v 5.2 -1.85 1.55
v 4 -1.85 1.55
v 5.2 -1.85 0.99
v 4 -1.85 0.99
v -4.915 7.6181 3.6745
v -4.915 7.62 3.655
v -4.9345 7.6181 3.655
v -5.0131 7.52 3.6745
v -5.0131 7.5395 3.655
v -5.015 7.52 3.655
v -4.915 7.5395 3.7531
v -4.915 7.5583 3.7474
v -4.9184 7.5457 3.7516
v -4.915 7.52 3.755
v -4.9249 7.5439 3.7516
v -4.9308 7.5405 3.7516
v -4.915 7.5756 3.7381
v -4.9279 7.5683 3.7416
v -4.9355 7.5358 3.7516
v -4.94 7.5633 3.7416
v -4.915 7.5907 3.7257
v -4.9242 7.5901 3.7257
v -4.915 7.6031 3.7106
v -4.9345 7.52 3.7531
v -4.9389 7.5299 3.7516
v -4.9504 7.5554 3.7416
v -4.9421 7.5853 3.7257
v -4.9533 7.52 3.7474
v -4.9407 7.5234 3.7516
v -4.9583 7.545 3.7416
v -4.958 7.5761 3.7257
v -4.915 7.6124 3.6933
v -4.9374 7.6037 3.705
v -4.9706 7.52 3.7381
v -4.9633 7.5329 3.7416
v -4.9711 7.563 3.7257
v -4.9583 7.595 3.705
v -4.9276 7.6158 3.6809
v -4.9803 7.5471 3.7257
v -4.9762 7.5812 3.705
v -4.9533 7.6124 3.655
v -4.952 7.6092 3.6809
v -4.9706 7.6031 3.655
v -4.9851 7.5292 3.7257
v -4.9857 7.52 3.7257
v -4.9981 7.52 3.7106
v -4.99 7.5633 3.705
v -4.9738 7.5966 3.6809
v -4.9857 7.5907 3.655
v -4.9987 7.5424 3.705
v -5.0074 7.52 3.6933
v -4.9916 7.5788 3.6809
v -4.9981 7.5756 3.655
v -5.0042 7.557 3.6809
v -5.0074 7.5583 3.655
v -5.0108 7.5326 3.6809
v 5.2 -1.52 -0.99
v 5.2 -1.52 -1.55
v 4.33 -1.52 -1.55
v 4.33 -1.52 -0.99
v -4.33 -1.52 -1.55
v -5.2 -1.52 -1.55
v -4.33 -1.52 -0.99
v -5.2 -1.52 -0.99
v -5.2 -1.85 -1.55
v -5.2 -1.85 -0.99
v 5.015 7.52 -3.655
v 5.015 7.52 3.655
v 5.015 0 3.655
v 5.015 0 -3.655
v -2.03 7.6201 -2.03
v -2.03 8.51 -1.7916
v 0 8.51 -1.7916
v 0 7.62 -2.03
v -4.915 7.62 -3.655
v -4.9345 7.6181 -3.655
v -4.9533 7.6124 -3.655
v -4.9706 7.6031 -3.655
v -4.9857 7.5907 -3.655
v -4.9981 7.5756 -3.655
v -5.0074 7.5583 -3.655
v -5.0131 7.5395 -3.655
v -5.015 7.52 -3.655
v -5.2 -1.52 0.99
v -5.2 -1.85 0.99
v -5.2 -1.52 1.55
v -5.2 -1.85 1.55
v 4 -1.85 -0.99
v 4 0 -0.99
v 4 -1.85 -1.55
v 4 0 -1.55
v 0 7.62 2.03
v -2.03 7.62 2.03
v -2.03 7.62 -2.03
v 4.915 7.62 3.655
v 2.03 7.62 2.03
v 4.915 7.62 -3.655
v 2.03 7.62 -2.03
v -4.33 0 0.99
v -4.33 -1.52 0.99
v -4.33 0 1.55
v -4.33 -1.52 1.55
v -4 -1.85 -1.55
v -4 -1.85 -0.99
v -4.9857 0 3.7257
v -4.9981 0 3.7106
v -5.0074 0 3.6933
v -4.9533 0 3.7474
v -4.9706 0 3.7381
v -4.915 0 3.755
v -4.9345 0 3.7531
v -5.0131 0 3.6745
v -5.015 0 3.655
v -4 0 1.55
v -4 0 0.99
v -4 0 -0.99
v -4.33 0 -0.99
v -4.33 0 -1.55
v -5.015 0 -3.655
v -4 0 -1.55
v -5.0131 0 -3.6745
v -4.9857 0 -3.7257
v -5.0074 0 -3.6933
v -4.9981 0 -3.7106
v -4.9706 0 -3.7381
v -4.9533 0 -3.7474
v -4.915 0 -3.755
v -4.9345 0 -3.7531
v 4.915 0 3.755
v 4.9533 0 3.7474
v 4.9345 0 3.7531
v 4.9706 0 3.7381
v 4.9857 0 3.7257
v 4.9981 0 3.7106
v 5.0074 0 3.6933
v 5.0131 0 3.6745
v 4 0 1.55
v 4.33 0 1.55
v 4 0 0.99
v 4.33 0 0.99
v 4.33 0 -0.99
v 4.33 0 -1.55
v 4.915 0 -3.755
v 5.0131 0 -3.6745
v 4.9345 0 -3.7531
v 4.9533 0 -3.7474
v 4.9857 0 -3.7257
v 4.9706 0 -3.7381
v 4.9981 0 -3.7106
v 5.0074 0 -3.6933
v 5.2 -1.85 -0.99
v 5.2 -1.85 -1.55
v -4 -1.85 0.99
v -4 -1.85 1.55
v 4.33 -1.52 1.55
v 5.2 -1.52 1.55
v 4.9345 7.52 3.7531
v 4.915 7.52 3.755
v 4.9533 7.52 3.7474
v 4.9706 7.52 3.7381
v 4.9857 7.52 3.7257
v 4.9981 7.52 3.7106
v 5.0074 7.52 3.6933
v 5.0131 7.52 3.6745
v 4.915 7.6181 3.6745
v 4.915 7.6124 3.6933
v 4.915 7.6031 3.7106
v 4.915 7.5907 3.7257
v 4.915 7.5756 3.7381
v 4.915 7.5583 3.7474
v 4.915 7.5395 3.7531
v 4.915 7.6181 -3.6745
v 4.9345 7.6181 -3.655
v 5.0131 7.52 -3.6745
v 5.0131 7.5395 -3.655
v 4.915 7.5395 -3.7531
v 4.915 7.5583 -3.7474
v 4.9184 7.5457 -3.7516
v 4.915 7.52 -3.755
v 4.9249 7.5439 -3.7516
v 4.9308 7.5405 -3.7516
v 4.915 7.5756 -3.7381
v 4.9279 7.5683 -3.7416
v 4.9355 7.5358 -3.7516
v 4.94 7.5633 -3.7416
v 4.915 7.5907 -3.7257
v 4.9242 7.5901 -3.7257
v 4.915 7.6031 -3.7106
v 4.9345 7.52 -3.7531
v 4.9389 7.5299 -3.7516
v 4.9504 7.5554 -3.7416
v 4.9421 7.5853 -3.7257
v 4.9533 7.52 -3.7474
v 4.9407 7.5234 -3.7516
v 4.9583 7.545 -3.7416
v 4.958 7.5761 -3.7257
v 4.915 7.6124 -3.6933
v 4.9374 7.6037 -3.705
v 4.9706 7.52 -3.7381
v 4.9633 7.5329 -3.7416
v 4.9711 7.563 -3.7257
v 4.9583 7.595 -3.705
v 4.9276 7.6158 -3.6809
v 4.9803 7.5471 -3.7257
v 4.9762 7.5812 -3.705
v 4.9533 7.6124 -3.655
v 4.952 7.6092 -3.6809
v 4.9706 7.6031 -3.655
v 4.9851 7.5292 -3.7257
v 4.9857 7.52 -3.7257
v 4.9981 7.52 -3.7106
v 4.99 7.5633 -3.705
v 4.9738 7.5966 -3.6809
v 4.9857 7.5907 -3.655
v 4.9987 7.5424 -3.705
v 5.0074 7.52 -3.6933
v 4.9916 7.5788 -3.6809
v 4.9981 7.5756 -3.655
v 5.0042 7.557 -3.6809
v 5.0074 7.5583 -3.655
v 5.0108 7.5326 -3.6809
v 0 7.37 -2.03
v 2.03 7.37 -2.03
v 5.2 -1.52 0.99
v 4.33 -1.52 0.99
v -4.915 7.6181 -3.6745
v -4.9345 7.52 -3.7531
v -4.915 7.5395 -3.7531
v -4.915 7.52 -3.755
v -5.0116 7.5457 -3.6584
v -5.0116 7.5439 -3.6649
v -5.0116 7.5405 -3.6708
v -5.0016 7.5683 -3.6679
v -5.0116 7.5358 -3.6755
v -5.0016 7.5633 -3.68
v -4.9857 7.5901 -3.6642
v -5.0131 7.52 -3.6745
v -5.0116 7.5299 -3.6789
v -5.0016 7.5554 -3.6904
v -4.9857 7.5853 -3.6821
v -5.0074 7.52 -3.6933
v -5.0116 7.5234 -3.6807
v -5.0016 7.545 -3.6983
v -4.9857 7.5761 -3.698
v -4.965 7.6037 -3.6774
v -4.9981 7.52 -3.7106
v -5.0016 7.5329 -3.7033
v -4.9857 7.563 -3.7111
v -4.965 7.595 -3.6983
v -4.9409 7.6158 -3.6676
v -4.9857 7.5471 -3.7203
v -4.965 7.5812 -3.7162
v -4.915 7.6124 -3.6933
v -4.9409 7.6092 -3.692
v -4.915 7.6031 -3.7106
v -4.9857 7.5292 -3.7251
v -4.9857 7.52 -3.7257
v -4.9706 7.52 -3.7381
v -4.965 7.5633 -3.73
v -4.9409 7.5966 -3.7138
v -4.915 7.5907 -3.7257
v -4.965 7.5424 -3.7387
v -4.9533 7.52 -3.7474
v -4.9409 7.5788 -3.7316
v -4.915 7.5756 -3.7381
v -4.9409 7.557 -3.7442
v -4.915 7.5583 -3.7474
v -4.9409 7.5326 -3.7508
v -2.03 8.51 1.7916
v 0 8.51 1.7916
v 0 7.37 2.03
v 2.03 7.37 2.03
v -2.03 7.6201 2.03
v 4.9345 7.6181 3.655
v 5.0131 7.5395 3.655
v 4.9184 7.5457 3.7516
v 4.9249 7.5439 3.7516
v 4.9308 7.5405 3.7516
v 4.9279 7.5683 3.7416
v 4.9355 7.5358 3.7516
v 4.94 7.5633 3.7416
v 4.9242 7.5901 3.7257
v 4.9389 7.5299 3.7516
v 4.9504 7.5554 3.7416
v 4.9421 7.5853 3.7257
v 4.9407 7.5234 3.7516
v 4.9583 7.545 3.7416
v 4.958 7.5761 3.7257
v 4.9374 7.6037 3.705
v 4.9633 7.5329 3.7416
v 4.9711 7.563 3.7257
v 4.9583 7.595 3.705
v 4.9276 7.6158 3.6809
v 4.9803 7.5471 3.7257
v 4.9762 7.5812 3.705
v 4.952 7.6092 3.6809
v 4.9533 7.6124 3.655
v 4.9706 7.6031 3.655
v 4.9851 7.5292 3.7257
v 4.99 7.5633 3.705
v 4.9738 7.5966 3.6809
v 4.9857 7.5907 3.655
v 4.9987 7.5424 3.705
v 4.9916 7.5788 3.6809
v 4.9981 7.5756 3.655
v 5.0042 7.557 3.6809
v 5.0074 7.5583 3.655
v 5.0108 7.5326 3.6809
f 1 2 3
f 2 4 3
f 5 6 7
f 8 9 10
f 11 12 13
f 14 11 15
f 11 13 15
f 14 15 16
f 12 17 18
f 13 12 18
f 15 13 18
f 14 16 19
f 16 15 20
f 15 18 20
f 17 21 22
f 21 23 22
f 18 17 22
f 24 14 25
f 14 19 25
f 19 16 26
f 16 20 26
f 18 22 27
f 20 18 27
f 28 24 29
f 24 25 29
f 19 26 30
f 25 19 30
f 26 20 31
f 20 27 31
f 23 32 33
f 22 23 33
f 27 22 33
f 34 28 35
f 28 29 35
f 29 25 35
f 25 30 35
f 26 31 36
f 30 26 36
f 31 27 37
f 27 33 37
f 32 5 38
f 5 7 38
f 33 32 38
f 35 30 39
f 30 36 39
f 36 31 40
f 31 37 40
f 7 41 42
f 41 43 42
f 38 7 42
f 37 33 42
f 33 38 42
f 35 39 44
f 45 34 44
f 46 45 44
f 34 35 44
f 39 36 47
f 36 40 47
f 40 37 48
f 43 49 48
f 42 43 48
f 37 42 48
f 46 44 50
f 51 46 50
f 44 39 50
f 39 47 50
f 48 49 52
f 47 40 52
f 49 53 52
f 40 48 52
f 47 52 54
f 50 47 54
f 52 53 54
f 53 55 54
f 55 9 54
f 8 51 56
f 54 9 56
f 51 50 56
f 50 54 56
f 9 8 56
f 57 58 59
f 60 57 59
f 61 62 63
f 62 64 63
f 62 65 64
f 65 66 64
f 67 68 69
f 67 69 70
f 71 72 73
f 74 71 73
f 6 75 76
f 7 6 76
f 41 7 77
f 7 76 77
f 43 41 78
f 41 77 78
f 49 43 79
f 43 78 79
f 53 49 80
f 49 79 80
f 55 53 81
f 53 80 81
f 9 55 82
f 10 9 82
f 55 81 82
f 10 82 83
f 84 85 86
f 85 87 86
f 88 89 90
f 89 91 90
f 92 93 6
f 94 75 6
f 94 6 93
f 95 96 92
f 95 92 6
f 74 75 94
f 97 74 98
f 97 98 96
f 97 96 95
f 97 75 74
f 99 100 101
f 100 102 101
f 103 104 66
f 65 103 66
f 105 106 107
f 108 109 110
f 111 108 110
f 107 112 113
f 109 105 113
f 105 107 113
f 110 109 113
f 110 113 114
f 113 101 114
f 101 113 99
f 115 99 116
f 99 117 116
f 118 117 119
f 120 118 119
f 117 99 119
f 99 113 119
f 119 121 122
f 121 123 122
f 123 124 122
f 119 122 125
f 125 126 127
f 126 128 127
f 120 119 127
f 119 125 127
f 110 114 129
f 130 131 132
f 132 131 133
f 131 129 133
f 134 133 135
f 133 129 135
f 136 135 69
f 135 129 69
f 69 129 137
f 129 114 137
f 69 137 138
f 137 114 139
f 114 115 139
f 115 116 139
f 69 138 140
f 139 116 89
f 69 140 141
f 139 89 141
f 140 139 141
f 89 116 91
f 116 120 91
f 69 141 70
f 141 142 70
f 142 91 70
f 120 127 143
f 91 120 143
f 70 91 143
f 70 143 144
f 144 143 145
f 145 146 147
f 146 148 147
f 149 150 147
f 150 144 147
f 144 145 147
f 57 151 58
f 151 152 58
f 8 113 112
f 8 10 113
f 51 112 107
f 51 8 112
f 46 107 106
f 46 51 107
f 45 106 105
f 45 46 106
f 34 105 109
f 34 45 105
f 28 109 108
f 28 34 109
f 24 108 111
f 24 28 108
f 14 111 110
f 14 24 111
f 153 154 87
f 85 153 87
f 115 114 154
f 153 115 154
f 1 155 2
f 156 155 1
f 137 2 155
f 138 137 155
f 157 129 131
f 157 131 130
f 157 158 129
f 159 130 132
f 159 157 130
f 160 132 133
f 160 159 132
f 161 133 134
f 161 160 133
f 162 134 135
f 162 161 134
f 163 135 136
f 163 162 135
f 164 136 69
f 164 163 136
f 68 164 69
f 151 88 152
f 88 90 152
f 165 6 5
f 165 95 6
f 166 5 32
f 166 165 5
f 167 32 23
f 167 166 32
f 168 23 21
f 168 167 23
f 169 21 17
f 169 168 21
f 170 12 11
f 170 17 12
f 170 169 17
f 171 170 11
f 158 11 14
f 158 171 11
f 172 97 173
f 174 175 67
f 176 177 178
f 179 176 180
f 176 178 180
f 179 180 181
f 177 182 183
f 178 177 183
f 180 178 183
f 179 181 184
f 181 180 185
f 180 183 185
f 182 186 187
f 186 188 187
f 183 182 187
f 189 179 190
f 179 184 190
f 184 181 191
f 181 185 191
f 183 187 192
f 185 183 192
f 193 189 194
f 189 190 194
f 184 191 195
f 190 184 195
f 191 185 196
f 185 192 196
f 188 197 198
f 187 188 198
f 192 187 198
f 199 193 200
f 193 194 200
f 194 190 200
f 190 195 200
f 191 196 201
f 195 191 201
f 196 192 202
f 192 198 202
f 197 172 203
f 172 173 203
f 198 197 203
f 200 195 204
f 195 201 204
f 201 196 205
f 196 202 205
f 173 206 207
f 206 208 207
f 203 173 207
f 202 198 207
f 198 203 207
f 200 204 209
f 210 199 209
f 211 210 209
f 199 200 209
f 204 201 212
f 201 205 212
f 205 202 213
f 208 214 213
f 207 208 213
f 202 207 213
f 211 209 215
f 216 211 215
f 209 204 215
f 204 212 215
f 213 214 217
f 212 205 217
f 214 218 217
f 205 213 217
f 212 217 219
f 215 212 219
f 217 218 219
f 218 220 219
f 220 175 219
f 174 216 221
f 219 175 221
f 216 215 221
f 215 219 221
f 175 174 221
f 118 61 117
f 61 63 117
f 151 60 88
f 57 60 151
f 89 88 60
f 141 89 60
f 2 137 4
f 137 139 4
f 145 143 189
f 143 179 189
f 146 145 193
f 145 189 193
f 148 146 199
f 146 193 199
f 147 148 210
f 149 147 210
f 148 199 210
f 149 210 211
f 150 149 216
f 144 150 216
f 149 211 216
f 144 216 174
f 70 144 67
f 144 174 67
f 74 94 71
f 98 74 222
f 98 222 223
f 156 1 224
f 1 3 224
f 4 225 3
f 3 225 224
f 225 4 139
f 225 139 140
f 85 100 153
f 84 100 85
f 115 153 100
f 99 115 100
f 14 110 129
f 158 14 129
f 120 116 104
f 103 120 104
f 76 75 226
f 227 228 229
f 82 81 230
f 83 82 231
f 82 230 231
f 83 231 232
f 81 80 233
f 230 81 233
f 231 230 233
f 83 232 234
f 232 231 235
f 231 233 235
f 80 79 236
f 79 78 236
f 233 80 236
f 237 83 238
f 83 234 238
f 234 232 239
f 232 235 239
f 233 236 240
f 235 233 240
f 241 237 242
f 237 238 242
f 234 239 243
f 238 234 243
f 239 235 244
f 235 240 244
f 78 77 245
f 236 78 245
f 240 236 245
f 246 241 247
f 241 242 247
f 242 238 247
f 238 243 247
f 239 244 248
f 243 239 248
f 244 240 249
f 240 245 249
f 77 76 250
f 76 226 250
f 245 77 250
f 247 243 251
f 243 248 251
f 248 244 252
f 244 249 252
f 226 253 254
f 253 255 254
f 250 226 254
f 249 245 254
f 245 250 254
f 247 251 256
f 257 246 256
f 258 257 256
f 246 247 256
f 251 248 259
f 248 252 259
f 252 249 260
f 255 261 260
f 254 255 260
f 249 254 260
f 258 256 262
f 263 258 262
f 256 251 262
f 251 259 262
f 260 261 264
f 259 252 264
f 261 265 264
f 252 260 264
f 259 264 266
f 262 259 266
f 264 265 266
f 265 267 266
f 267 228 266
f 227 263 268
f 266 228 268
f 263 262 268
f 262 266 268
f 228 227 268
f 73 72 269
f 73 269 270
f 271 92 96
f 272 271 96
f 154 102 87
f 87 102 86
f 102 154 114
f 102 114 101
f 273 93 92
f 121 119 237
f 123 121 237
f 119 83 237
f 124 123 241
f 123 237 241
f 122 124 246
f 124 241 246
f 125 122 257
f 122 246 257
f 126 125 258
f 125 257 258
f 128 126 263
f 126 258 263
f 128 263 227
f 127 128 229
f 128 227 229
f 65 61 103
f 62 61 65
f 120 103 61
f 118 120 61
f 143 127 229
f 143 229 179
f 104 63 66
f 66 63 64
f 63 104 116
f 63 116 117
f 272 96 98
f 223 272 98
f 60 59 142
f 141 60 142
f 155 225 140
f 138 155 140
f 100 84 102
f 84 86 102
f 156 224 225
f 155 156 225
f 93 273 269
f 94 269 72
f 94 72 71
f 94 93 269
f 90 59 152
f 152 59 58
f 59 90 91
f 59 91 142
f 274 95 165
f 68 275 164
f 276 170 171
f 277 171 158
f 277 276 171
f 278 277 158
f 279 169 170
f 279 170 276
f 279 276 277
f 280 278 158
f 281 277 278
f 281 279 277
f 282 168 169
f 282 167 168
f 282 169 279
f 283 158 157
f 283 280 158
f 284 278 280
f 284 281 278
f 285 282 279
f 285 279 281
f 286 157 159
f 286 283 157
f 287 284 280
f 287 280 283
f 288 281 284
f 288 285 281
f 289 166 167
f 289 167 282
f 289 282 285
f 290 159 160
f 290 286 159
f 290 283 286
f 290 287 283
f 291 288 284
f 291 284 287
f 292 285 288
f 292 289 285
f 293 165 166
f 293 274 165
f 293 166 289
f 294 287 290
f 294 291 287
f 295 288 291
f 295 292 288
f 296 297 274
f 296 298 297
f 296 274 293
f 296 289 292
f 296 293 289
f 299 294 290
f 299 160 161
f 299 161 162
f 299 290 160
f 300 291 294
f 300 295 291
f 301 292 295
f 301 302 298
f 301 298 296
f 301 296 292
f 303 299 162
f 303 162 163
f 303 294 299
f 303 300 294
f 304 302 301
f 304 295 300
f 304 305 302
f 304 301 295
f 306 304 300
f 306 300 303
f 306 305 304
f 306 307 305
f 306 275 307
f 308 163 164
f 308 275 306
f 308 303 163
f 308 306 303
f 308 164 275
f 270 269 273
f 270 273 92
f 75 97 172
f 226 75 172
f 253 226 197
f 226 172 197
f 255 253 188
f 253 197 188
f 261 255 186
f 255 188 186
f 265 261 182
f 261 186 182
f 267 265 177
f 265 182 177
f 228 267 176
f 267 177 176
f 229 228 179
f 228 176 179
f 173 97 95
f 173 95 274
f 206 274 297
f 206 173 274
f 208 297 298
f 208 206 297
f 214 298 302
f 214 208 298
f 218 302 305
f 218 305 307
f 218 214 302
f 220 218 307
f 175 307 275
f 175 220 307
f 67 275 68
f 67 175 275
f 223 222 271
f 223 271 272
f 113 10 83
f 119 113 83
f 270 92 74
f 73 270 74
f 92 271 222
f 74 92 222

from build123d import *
from OCP.BRepFilletAPI import BRepFilletAPI_MakeChamfer

# Parameters (mm, degrees)
SKETCH1_W           = 10.03
SKETCH1_H           = 7.51
BOSS_EXTRUDE1_DEPTH = 7.62
SKETCH2_W           = 2.03
SKETCH2_H           = 4.06
BOSS_EXTRUDE2_DEPTH = 0.89
CHAMFER1_SIZE       = 0.89
CHAMFER1_SIZE_2     = 0.238474781
SKETCH3_W           = 2.03
SKETCH3_H           = 4.06
CUT_EXTRUDE1_DEPTH  = 0.25
BOSS_EXTRUDE3_DEPTH = 0.28
LPATTERN1_COUNT     = 2
LPATTERN1_PITCH     = 2.54
FILLET1_R           = 0.1


with BuildPart() as part:
    # Sketch1 → Boss-Extrude1 (new body)
    with BuildSketch(Plane(origin=(0, 0, 0), x_dir=(1, 0, 0), z_dir=(0, 1, 0))):
        Rectangle(SKETCH1_W, SKETCH1_H)
    extrude(amount=BOSS_EXTRUDE1_DEPTH)

    # Sketch2 → Boss-Extrude2 (add)
    with BuildSketch(Plane(origin=(0, 7.62, 0), x_dir=(1, 0, 0), z_dir=(0, 1, 0))):
        with Locations((-1.015, 0)):
            Rectangle(SKETCH2_W, SKETCH2_H)
    extrude(amount=BOSS_EXTRUDE2_DEPTH)

    # Chamfer1
    chamfer1_edges_1 = [part.edges().sort_by_distance(p)[0] for p in [
        (-1.015, 8.51, -2.03),
    ]]
    chamfer1_side_1 = [part.faces().sort_by_distance(p)[0] for p in [
        (-1.015, 8.505230504, -2.03),
    ]]
    chamfer1_edges_2 = [part.edges().sort_by_distance(p)[0] for p in [
        (-1.015, 8.51, 2.03),
    ]]
    chamfer1_side_2 = [part.faces().sort_by_distance(p)[0] for p in [
        (-1.015, 8.505230504, 2.03),
    ]]
    chamfer1 = BRepFilletAPI_MakeChamfer(part.part.solid().wrapped)
    for e in chamfer1_edges_1:
        chamfer1.Add(CHAMFER1_SIZE - 0.0001, CHAMFER1_SIZE_2 - 0.0001, e.wrapped, chamfer1_side_1[0].wrapped)
    for e in chamfer1_edges_2:
        chamfer1.Add(CHAMFER1_SIZE - 0.0001, CHAMFER1_SIZE_2 - 0.0001, e.wrapped, chamfer1_side_2[0].wrapped)
    add(Compound.cast(chamfer1.Shape()), mode=Mode.REPLACE)  # a hair under: the kernel refuses the full size

    # Sketch3 → Cut-Extrude1 (cut)
    with BuildSketch(Plane(origin=(0, 7.62, 0), x_dir=(1, 0, 0), z_dir=(0, 1, 0))):
        with Locations((1.015, 0)):
            Rectangle(SKETCH3_W, SKETCH3_H)
    extrude(amount=-CUT_EXTRUDE1_DEPTH, mode=Mode.SUBTRACT)

    # Sketch4 → Boss-Extrude3 (add, symmetric)
    with BuildSketch(Plane.XY.offset(1.27)):
        Polygon((4.33, 0), (4, 0), (4, -1.85), (5.2, -1.85), (5.2, -1.52), (4.33, -1.52), align=None)
        Polygon((-4, -1.85), (-5.2, -1.85), (-5.2, -1.52), (-4.33, -1.52), (-4.33, 0), (-4, 0), align=None)
    boss_extrude3 = extrude(amount=BOSS_EXTRUDE3_DEPTH, both=True)

    # LPattern1: Boss-Extrude3 ×2
    with Locations(*[(0, 0, -i * LPATTERN1_PITCH) for i in range(1, LPATTERN1_COUNT)]):
        add(boss_extrude3)

    # Fillet1
    fillet1_edges = [part.edges().sort_by_distance(p)[0] for p in [
        (5.015, 7.62, 0),
        (0, 7.62, -3.755),
        (-5.015, 7.62, 0),
        (0, 7.62, 3.755),
        (-5.015, 3.81, -3.755),
        (5.015, 3.81, -3.755),
        (5.015, 3.81, 3.755),
        (-5.015, 3.81, 3.755),
    ]]
    fillet(fillet1_edges, radius=FILLET1_R)


solid = part.part
